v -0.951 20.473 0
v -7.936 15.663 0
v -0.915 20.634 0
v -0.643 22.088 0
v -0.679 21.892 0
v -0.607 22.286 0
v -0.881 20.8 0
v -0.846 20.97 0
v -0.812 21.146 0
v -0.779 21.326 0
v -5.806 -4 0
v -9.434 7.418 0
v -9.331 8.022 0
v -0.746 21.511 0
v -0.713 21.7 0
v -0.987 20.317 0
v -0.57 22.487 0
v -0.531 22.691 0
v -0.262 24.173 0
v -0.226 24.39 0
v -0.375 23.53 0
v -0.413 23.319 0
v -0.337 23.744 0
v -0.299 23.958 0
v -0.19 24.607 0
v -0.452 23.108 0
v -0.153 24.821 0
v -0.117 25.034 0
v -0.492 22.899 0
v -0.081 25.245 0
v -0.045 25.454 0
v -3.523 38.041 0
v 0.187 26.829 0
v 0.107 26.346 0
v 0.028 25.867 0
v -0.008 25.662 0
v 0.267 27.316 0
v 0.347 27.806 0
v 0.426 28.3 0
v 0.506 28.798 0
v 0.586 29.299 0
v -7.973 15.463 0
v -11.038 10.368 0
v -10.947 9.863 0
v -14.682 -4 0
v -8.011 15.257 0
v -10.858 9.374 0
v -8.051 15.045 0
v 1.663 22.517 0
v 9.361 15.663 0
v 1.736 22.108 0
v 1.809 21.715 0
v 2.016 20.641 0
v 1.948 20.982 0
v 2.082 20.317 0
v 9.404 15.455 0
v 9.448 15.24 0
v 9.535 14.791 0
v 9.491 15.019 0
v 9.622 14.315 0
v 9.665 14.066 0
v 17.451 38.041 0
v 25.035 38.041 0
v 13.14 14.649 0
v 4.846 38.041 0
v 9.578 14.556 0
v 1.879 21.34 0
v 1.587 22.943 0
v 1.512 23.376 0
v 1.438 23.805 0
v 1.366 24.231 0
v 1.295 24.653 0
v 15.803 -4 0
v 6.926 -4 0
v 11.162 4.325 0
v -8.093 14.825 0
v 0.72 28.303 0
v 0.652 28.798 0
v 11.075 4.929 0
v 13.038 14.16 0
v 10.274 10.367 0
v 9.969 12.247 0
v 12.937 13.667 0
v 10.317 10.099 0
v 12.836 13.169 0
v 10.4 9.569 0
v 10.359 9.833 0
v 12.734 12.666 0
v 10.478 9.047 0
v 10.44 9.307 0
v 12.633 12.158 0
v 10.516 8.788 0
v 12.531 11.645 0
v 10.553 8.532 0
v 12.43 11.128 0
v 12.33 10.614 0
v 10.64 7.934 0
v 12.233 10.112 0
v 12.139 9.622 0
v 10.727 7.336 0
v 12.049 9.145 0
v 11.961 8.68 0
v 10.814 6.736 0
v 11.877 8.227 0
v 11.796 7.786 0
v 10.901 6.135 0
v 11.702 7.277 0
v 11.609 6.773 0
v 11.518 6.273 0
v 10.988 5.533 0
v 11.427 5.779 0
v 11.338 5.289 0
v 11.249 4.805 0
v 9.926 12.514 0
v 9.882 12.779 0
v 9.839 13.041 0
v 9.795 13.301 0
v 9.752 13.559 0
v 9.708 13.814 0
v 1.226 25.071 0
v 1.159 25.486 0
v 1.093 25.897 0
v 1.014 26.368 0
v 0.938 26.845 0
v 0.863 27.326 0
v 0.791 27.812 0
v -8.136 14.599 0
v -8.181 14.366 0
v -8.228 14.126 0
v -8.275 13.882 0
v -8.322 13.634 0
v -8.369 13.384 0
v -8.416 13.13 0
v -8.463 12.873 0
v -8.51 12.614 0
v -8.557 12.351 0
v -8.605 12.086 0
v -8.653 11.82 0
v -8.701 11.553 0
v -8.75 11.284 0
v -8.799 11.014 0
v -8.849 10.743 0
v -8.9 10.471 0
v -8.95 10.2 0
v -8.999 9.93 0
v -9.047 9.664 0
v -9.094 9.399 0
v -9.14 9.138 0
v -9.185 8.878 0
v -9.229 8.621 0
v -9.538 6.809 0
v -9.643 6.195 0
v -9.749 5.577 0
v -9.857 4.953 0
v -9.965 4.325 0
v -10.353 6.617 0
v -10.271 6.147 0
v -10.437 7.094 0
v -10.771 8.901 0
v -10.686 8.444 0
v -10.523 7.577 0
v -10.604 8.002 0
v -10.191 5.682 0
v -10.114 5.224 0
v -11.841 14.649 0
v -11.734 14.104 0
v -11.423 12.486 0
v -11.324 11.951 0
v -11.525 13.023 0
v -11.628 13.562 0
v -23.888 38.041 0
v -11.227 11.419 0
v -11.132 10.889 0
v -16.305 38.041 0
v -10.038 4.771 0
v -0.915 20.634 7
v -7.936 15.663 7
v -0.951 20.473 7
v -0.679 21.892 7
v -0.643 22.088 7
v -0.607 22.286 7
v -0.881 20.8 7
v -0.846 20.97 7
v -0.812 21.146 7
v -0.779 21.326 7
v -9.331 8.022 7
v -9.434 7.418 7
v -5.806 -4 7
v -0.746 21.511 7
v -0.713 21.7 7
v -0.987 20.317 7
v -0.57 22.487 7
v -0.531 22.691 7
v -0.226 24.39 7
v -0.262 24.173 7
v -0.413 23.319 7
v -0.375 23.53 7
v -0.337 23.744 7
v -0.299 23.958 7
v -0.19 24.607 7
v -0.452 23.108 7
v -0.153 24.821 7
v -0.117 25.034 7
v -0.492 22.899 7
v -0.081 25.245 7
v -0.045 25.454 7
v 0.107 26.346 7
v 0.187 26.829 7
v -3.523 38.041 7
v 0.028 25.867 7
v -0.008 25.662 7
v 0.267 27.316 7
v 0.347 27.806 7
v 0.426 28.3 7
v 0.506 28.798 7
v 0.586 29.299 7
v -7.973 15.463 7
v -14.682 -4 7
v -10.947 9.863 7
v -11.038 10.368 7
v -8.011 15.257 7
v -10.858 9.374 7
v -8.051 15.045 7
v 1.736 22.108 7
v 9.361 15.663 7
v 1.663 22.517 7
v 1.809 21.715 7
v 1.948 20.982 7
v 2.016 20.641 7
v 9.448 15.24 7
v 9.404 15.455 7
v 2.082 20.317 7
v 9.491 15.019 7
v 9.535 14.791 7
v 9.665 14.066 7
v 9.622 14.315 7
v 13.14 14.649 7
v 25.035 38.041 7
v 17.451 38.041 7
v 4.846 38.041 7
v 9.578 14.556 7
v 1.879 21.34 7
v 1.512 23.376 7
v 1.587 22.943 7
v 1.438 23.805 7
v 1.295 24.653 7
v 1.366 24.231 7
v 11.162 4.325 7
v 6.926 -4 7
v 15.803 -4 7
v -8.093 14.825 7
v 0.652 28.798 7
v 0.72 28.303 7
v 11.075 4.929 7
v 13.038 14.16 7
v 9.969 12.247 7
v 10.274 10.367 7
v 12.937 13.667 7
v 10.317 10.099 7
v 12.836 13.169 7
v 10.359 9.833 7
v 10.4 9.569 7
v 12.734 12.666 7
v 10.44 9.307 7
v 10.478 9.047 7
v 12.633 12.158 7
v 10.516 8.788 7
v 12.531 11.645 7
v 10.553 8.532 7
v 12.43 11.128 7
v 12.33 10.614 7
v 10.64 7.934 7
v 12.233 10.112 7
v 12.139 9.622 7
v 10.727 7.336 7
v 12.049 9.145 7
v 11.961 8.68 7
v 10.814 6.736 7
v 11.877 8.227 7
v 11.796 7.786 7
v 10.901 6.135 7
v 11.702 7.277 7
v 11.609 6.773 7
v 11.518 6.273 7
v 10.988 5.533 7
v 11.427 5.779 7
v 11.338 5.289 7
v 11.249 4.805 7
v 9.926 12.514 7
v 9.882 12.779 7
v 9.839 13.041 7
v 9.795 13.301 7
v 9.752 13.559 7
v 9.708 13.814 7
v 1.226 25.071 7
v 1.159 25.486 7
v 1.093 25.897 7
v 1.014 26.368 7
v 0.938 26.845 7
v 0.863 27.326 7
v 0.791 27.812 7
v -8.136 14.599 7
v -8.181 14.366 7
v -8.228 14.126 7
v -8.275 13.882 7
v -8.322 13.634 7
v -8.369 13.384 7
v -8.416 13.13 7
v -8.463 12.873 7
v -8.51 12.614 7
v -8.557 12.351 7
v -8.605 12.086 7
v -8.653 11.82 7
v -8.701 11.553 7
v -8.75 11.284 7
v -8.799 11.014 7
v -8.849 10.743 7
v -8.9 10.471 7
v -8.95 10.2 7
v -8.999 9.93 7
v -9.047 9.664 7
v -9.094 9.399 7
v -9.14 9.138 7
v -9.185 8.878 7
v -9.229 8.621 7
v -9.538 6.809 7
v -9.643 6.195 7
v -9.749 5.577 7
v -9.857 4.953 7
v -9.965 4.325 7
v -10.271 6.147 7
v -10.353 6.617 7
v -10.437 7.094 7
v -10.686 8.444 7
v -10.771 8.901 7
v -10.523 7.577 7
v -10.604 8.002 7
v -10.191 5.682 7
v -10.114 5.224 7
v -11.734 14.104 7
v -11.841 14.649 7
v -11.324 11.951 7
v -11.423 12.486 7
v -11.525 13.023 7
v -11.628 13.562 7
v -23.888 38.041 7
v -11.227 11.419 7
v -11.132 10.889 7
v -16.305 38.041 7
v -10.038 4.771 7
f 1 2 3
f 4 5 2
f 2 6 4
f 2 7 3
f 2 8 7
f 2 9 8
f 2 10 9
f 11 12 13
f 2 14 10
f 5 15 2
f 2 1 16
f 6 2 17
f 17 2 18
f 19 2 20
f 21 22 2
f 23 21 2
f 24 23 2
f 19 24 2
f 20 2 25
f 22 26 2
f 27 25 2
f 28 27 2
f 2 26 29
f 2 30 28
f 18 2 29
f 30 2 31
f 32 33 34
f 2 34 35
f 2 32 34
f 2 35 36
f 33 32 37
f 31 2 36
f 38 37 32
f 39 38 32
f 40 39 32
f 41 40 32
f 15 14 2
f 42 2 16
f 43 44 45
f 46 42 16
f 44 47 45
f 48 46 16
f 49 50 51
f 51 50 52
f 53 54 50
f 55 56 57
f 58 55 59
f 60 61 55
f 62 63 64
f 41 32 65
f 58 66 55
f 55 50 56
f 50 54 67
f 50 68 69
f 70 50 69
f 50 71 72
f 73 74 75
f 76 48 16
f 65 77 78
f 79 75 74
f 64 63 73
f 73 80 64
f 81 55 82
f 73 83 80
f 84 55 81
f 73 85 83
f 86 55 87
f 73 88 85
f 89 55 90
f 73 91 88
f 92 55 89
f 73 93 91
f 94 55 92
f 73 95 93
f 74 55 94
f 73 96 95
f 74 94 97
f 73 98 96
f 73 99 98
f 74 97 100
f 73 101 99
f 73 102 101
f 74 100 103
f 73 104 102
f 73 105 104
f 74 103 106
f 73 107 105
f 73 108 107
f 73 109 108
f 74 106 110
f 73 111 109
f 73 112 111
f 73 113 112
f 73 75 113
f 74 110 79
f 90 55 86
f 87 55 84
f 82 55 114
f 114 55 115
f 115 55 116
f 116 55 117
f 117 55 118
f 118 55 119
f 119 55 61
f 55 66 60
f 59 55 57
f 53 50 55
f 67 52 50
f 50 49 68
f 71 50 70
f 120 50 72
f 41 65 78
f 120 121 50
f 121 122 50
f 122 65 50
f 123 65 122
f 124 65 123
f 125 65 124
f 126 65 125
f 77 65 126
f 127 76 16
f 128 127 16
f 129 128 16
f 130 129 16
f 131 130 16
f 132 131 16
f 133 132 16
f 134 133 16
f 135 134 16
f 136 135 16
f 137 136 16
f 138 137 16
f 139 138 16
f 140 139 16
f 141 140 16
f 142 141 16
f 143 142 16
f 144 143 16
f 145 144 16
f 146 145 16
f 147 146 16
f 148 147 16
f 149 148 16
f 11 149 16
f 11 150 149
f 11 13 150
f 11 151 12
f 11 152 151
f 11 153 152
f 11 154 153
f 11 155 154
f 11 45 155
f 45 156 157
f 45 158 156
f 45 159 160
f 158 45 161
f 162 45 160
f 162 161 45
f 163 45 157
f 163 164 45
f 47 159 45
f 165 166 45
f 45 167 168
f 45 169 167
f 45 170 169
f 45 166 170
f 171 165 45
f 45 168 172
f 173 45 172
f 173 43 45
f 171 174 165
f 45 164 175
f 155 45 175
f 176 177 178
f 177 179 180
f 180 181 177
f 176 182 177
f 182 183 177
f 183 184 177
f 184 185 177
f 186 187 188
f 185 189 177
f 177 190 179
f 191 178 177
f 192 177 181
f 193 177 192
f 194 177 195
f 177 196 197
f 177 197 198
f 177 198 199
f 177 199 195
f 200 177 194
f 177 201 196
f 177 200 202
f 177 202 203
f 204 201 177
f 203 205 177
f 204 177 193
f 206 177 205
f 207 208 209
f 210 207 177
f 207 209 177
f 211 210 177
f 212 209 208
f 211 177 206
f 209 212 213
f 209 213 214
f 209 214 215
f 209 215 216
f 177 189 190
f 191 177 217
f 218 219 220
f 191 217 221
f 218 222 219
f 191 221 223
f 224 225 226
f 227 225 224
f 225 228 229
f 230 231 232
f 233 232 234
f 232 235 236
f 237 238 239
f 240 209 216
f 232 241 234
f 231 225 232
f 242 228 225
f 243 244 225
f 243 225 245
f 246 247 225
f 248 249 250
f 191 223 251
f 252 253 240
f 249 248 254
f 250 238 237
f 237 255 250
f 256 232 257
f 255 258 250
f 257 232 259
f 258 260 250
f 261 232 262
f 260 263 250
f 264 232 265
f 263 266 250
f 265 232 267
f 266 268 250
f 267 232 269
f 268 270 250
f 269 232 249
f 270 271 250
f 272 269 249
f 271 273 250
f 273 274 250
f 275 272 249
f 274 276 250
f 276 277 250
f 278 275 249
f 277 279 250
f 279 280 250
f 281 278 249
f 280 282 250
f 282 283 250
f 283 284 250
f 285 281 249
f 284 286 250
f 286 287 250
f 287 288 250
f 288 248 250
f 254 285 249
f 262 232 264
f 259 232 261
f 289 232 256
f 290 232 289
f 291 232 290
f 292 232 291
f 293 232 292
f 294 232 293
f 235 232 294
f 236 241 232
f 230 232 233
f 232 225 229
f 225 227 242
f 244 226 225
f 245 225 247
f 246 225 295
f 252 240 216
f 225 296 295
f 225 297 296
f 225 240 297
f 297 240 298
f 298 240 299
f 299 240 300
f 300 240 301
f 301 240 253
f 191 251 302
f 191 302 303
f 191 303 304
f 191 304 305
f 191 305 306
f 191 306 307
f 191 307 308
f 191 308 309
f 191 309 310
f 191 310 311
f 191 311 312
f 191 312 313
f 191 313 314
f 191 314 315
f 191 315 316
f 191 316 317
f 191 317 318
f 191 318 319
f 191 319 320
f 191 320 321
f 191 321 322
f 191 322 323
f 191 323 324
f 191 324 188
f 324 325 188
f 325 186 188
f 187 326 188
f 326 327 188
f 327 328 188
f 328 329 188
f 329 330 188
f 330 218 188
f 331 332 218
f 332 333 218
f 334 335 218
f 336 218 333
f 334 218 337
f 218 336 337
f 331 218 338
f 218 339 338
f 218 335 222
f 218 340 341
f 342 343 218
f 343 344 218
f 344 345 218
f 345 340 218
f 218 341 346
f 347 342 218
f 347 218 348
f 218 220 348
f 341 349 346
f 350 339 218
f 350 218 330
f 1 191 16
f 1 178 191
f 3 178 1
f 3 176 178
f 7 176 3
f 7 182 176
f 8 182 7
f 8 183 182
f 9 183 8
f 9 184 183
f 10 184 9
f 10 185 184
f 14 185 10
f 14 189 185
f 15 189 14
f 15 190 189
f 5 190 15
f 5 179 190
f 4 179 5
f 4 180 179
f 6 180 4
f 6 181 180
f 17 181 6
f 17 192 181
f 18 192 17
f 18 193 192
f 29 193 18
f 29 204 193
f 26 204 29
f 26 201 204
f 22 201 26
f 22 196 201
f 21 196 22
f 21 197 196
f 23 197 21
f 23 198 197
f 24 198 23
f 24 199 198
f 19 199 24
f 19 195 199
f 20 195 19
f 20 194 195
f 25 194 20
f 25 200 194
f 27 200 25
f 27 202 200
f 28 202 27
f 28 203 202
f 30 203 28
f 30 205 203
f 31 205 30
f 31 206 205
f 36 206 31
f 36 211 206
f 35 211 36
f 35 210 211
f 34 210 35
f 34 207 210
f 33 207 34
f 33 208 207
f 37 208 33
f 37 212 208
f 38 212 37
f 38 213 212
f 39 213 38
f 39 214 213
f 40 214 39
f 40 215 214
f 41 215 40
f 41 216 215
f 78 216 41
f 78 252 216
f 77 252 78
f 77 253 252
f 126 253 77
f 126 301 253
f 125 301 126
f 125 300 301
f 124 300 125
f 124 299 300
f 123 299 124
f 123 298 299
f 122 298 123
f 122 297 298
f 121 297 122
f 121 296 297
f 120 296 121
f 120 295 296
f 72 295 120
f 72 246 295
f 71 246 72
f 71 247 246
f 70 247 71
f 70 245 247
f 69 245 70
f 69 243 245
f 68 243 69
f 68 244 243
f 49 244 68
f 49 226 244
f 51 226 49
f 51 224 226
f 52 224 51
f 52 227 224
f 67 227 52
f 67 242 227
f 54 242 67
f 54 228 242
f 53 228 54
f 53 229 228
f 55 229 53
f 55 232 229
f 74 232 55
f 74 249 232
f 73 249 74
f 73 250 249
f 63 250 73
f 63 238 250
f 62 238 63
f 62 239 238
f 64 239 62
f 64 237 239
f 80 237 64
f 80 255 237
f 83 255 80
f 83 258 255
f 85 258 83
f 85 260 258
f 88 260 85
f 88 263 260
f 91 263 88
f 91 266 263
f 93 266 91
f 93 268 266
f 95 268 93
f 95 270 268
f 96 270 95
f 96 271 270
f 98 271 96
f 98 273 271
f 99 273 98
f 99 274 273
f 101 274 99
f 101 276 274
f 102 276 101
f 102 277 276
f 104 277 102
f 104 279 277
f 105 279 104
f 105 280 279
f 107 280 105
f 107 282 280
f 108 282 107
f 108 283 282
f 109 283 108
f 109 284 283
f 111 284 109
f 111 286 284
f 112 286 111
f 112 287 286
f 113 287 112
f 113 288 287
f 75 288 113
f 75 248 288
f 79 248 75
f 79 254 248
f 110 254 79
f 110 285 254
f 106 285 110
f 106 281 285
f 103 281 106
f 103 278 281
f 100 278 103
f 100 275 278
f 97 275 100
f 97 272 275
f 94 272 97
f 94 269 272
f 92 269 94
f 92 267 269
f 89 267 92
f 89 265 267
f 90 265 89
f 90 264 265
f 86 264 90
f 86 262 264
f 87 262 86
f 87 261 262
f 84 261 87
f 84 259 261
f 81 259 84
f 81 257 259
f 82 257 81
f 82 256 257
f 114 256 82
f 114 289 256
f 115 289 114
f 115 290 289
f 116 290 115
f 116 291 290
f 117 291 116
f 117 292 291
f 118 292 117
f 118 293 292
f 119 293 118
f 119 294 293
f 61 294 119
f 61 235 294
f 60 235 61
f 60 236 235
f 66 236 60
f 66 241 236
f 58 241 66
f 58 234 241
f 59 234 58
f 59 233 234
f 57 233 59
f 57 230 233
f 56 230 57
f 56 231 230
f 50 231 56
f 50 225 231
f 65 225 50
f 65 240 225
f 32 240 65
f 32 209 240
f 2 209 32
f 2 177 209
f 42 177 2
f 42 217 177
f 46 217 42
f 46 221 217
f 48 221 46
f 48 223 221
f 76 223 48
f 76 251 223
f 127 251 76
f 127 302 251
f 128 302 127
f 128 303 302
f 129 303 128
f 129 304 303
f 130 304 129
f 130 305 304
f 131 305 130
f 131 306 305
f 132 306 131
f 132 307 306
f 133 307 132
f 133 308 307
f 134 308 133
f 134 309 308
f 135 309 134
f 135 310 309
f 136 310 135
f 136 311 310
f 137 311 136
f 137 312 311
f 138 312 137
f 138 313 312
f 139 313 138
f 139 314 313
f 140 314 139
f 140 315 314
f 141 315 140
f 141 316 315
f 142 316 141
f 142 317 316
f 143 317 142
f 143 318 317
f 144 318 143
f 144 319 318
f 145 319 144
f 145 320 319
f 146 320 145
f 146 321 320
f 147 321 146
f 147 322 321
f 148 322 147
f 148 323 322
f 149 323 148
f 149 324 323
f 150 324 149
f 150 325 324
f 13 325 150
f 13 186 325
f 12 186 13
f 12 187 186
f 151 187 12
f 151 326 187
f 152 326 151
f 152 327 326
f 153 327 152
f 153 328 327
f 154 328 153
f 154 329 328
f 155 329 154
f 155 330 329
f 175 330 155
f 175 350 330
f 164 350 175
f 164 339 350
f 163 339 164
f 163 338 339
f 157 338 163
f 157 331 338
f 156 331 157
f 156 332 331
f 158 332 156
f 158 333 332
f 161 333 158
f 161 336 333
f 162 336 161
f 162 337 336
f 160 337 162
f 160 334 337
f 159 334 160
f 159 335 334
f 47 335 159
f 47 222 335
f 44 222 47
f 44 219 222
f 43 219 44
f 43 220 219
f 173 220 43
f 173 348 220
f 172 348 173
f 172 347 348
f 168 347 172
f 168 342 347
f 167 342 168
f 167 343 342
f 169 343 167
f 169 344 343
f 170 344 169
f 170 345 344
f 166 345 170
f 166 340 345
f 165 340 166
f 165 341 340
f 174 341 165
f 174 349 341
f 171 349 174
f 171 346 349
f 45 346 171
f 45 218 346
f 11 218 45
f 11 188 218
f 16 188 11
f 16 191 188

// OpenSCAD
// file: glyph.scad
// glyph — the shared geometry of every letter in the set. Defines named geometry
// only, so it renders nothing on its own; each letter part includes it and calls
// letter(). Every dimension lives in ../../lib/common.scad.
//
// A LETTER IS NOTHING BUT A LETTER. No plinth, no tongue, no tab — it is the
// bare glyph, and it attaches by standing in the deck groove and resting on the
// groove's floor. Anything else on it would be a distraction on a learning toy.
//
// It is a flat plate of one thickness, printed face-down: no overhang anywhere,
// no supports, and the face on the bed comes out smoothest.
//
// TWO TRAPS WITH text():
//
//  * A missing font FALLS BACK SILENTLY — no warning, no error, just different
//    letters. "Liberation Sans" was the first choice here because OpenSCAD
//    bundles it; on macOS the bundled faces are not registered with fontconfig,
//    so it rendered the fallback face instead and nothing said so. To check a
//    font resolved, render a string with it and with a deliberately bogus name
//    and compare bounding boxes: identical means it fell back.
//  * `size` is not the cap height in general. For Helvetica Bold they coincide
//    (size 44 -> 44.0 mm cap), which is why letter_size reads as a height.
//    Change the font and re-measure.

include <../../lib/common.scad>

// The letter's outline, upright in the XY plane, ready to be extruded along Z
// (which is the letter's thickness, and the print's build axis).
//
//   y = 0   is the deck surface
//   y < 0   is the part standing down inside the groove. It reaches letter_bury,
//           which is where the tapered groove closes to letter_t — NOT the
//           groove's floor. The letter wedges; it never bottoms out.
module glyph_2d(ch) {
    intersection() {
        translate([0, -letter_bury])
            scale([letter_condense, 1])
                text(ch, size = letter_size, font = letter_font,
                     halign = "center", valign = "baseline");
        // Trimmed flat at the baseline. Round letters (O, C, G, S) overshoot the
        // baseline by design, and a letter standing on a convex curve rocks —
        // there is nothing to stop it leaning. The trim costs nothing visible
        // and gives every letter a flat foot on the groove floor.
        translate([-200, -letter_bury]) square([400, 400]);
    }
}

// One letter, in its print orientation: lying on its face, thickness up Z.
module letter(ch) {
    linear_extrude(letter_t) glyph_2d(ch);
}

// Where that letter sits once it is dropped into a chassis, for fit checks.
module letter_fitted(ch) {
    translate([0, letter_t/2, body_top]) rotate([90, 0, 0]) letter(ch);
}
// main file
// letter W — one part. See glyph.scad for the geometry and lib/common.scad for
// the dimensions. Prints lying on its face, exactly as exported: no supports.

include <glyph.scad>

letter("W");
